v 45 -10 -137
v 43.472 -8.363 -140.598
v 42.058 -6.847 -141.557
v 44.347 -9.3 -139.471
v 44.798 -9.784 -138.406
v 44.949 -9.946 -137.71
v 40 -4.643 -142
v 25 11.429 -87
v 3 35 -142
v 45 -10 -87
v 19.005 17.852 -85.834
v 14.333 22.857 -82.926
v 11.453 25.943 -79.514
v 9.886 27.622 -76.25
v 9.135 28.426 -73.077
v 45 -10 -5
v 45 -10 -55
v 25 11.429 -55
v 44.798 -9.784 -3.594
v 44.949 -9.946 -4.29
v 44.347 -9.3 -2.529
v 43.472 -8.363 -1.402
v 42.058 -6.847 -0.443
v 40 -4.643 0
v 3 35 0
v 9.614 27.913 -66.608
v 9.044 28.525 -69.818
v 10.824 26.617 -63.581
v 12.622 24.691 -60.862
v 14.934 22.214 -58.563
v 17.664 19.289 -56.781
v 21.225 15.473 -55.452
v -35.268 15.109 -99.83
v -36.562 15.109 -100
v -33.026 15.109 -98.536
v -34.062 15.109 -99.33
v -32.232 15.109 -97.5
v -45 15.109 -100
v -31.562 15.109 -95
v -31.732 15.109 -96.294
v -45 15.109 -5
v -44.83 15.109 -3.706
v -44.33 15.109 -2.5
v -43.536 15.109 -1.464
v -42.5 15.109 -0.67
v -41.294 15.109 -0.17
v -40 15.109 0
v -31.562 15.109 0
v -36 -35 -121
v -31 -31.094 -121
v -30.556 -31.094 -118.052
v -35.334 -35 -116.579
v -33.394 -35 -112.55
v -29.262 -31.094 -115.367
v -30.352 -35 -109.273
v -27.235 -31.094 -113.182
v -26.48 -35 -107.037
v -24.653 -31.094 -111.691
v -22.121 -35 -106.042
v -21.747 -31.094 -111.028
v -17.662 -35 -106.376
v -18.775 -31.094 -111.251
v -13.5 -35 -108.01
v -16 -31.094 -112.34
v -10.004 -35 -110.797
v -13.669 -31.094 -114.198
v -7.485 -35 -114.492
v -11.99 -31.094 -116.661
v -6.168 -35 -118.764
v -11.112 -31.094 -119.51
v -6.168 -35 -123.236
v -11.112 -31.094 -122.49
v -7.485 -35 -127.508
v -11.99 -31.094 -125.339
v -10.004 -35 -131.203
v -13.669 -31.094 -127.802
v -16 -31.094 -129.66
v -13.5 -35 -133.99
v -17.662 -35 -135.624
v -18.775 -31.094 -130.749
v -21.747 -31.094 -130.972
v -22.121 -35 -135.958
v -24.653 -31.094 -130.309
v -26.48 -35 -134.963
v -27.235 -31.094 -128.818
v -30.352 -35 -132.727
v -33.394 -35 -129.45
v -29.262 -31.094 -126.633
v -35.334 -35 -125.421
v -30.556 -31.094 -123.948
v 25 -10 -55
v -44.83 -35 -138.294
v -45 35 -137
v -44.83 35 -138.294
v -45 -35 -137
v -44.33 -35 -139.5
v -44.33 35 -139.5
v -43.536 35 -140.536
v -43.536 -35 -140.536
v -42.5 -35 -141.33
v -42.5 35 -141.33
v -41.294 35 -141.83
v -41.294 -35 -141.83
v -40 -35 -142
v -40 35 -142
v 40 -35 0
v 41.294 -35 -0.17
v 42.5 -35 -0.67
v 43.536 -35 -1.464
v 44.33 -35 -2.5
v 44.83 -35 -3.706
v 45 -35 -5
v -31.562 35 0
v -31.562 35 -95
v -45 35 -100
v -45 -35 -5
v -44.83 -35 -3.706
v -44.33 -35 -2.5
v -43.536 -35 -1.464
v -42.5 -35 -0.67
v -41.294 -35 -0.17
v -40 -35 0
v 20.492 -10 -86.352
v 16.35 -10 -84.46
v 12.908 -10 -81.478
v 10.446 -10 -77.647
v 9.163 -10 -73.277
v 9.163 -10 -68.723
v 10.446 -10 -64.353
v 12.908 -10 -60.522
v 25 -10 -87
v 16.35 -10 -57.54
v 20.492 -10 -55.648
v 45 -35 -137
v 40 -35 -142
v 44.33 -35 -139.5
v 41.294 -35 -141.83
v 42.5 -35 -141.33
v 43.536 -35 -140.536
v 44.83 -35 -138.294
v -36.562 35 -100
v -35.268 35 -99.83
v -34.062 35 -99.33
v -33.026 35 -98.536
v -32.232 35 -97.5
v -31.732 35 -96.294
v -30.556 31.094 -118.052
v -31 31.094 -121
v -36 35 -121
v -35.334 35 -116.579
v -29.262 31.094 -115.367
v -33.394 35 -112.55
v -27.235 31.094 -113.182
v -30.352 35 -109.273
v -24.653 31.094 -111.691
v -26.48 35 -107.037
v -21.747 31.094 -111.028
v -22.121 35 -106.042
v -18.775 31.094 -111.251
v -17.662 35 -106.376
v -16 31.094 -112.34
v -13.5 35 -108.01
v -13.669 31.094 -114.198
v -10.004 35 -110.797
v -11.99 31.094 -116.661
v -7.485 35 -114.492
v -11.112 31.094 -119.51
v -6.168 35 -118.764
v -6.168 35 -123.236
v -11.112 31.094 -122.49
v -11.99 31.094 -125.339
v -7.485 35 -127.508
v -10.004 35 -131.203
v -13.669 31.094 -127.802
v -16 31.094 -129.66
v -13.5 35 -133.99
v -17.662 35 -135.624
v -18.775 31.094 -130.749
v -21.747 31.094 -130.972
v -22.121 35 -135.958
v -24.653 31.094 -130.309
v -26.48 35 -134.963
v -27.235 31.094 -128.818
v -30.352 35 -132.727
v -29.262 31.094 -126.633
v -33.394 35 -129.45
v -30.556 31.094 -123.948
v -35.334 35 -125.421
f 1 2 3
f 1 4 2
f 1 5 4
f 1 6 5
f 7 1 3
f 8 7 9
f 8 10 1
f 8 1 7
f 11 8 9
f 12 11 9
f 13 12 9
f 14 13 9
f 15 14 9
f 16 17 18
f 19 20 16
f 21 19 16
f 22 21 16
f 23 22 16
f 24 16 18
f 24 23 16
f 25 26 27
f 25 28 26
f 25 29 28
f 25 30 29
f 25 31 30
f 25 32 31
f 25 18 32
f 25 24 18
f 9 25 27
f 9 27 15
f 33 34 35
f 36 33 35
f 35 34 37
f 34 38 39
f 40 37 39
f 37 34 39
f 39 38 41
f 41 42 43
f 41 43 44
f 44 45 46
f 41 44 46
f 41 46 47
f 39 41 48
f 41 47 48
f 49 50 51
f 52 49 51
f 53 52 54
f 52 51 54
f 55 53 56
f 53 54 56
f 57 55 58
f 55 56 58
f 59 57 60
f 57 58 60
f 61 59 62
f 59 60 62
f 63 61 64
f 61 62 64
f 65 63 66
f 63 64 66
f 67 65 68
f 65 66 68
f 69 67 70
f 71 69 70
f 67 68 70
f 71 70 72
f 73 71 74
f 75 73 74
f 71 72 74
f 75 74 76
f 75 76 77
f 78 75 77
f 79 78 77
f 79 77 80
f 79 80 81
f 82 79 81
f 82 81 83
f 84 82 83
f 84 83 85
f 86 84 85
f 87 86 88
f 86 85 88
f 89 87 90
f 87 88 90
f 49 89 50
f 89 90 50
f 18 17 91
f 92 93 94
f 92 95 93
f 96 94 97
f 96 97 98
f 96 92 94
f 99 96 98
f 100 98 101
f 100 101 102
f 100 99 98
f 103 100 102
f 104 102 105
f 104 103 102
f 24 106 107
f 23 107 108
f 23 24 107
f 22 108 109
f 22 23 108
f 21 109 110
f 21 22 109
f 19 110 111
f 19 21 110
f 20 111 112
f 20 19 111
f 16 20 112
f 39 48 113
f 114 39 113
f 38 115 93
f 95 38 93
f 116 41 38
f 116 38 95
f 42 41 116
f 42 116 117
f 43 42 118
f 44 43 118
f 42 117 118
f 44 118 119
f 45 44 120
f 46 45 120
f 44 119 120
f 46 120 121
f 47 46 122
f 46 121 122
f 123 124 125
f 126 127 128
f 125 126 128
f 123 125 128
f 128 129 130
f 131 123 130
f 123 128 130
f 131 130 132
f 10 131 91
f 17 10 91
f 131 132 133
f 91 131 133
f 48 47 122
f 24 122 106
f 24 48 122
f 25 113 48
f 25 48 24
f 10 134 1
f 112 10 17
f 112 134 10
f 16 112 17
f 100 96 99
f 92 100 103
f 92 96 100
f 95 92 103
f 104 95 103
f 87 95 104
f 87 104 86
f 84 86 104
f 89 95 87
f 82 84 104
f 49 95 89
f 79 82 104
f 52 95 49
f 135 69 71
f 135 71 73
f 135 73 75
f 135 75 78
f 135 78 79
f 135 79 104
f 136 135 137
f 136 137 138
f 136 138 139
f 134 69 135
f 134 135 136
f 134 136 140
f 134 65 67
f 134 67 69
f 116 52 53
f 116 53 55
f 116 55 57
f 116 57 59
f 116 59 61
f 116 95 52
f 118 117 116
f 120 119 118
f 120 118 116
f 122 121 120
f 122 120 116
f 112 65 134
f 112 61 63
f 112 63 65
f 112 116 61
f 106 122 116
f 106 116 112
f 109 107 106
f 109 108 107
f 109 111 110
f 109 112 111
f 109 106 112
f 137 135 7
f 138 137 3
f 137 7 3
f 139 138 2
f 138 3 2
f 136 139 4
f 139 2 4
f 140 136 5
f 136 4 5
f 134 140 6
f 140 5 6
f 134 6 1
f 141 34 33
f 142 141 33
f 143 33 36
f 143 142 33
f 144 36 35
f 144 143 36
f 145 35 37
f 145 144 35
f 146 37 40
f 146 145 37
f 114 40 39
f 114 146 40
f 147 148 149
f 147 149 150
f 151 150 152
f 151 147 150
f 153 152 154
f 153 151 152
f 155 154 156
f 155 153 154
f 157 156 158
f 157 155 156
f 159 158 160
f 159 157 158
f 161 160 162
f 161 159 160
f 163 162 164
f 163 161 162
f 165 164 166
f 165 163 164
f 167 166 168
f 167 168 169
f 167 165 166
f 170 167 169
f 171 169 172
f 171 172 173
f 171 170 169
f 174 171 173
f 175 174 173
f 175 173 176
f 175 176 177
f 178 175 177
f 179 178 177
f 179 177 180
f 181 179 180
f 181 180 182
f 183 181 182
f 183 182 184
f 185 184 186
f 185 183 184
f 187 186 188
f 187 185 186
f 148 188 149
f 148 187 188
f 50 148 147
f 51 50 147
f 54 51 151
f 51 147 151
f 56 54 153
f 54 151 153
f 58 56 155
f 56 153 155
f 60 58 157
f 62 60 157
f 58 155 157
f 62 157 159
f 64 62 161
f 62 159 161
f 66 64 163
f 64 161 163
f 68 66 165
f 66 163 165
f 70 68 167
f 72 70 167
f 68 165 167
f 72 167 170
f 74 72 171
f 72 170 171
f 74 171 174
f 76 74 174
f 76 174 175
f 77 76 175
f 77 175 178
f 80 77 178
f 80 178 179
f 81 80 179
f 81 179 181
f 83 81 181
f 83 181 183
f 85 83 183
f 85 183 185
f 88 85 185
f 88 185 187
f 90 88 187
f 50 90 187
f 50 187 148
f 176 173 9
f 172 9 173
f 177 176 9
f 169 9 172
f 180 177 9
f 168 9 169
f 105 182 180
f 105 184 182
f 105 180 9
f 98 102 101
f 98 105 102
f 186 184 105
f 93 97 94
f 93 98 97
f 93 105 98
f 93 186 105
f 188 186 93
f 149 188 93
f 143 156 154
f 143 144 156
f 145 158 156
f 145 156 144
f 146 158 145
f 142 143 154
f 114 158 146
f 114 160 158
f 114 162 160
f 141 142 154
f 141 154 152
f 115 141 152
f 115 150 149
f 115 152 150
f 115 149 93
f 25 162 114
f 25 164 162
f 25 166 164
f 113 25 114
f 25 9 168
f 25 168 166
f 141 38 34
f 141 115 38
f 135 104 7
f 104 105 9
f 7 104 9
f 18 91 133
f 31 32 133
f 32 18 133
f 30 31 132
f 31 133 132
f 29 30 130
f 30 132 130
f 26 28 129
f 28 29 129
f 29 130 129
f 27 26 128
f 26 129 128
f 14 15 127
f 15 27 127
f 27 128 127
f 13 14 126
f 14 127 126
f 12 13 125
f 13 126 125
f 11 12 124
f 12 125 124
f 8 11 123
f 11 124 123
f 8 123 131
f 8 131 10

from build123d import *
from OCP.BRepFilletAPI import BRepFilletAPI_MakeChamfer

# Parameters (mm, degrees)
BOSS_EXTRUDE1_DEPTH = 142
SKETCH2_W           = 13.438345352
SKETCH2_H           = 19.890532225
CUT_EXTRUDE1_DEPTH  = 100
SKETCH4_R           = 10
CUT_EXTRUDE2_DEPTH  = 100
CUT_EXTRUDE3_DEPTH  = 100
CHAMFER1_SIZE       = 5
CHAMFER1_SIZE2      = 3.906428133
FILLET5_R           = 5
FILLET6_R           = 5
FILLET7_R           = 5


with BuildPart() as part:
    # Sketch1 → Boss-Extrude1 (new body)
    with BuildSketch(Plane.XY):
        Polygon((-45, -35), (45, -35), (45, -10), (3, 35), (-45, 35), align=None)
    extrude(amount=-BOSS_EXTRUDE1_DEPTH)

    # Sketch2 → Cut-Extrude1 (cut)
    with BuildSketch(Plane.XY):
        with Locations((-38.280827324, 25.054733887)):
            Rectangle(SKETCH2_W, SKETCH2_H)
    extrude(amount=-CUT_EXTRUDE1_DEPTH, mode=Mode.SUBTRACT)

    # Sketch4 → Cut-Extrude2 (cut)
    with BuildSketch(Plane(origin=(0, 35, 0), x_dir=(1, 0, 0), z_dir=(0, 1, 0))):
        with Locations(Location((-21, 121, 0), (0, 0, 180))):
            Circle(SKETCH4_R)
    extrude(amount=-CUT_EXTRUDE2_DEPTH, mode=Mode.SUBTRACT)

    # 3DSketch2 → Cut-Extrude3 (cut)
    with BuildSketch(Plane(origin=(45, -10, -55), x_dir=(-0.5299989400031795, 0, -0.8479983040050884), z_dir=(0, 1, 0))):
        with BuildLine():
            Line((0, 0), (10.5999788, 16.95996608))
            ThreePointArc((10.5999788, 16.95996608), (32.647934704, 22.047955904), (37.735924528, 0))
            Line((37.735924528, 0), (27.135945728, -16.95996608))
            Line((27.135945728, -16.95996608), (0, 0))
        make_face()
    extrude(amount=CUT_EXTRUDE3_DEPTH, mode=Mode.SUBTRACT)

    # Chamfer1: one chamfer whose edges measure the first distance from different faces: ONE call of the kernel's chamfer builder (chamfer() names one face for all edges)
    chamfer1_edges_1 = [part.edges().sort_by_distance(p)[0] for p in [
        (-11, -35, -121),
    ]]
    chamfer1_side_1 = [part.faces().sort_by_distance(p)[0] for p in [
        (0.529233825, -35, -69.739919465),
    ]]
    chamfer1_edges_2 = [part.edges().sort_by_distance(p)[0] for p in [
        (-11, 35, -121),
    ]]
    chamfer1_side_2 = [part.faces().sort_by_distance(p)[0] for p in [
        (-16.497761799, 35, -73.425852449),
    ]]
    chamfer1 = BRepFilletAPI_MakeChamfer(part.part.solid().wrapped)
    for e in chamfer1_edges_1:
        chamfer1.Add(CHAMFER1_SIZE, CHAMFER1_SIZE2, e.wrapped, chamfer1_side_1[0].wrapped)  # the first distance lies on this face
    for e in chamfer1_edges_2:
        chamfer1.Add(CHAMFER1_SIZE, CHAMFER1_SIZE2, e.wrapped, chamfer1_side_2[0].wrapped)  # the first distance lies on this face
    add(Compound.cast(chamfer1.Shape()), mode=Mode.REPLACE)

    # Fillet5
    fillet5_edges = [part.edges().sort_by_distance(p)[0] for p in [
        (-31.561654648, 25.054733887, -100),
    ]]
    fillet(fillet5_edges, radius=FILLET5_R)

    # Fillet6
    fillet6_edges = [part.edges().sort_by_distance(p)[0] for p in [
        (-45, -9.945266113, 0),
        (45, -22.5, 0),
    ]]
    fillet(fillet6_edges, radius=FILLET6_R)

    # Fillet7
    fillet7_edges = [part.edges().sort_by_distance(p)[0] for p in [
        (-45, 0, -142),
        (45, -22.5, -142),
    ]]
    fillet(fillet7_edges, radius=FILLET7_R)


solid = part.part
